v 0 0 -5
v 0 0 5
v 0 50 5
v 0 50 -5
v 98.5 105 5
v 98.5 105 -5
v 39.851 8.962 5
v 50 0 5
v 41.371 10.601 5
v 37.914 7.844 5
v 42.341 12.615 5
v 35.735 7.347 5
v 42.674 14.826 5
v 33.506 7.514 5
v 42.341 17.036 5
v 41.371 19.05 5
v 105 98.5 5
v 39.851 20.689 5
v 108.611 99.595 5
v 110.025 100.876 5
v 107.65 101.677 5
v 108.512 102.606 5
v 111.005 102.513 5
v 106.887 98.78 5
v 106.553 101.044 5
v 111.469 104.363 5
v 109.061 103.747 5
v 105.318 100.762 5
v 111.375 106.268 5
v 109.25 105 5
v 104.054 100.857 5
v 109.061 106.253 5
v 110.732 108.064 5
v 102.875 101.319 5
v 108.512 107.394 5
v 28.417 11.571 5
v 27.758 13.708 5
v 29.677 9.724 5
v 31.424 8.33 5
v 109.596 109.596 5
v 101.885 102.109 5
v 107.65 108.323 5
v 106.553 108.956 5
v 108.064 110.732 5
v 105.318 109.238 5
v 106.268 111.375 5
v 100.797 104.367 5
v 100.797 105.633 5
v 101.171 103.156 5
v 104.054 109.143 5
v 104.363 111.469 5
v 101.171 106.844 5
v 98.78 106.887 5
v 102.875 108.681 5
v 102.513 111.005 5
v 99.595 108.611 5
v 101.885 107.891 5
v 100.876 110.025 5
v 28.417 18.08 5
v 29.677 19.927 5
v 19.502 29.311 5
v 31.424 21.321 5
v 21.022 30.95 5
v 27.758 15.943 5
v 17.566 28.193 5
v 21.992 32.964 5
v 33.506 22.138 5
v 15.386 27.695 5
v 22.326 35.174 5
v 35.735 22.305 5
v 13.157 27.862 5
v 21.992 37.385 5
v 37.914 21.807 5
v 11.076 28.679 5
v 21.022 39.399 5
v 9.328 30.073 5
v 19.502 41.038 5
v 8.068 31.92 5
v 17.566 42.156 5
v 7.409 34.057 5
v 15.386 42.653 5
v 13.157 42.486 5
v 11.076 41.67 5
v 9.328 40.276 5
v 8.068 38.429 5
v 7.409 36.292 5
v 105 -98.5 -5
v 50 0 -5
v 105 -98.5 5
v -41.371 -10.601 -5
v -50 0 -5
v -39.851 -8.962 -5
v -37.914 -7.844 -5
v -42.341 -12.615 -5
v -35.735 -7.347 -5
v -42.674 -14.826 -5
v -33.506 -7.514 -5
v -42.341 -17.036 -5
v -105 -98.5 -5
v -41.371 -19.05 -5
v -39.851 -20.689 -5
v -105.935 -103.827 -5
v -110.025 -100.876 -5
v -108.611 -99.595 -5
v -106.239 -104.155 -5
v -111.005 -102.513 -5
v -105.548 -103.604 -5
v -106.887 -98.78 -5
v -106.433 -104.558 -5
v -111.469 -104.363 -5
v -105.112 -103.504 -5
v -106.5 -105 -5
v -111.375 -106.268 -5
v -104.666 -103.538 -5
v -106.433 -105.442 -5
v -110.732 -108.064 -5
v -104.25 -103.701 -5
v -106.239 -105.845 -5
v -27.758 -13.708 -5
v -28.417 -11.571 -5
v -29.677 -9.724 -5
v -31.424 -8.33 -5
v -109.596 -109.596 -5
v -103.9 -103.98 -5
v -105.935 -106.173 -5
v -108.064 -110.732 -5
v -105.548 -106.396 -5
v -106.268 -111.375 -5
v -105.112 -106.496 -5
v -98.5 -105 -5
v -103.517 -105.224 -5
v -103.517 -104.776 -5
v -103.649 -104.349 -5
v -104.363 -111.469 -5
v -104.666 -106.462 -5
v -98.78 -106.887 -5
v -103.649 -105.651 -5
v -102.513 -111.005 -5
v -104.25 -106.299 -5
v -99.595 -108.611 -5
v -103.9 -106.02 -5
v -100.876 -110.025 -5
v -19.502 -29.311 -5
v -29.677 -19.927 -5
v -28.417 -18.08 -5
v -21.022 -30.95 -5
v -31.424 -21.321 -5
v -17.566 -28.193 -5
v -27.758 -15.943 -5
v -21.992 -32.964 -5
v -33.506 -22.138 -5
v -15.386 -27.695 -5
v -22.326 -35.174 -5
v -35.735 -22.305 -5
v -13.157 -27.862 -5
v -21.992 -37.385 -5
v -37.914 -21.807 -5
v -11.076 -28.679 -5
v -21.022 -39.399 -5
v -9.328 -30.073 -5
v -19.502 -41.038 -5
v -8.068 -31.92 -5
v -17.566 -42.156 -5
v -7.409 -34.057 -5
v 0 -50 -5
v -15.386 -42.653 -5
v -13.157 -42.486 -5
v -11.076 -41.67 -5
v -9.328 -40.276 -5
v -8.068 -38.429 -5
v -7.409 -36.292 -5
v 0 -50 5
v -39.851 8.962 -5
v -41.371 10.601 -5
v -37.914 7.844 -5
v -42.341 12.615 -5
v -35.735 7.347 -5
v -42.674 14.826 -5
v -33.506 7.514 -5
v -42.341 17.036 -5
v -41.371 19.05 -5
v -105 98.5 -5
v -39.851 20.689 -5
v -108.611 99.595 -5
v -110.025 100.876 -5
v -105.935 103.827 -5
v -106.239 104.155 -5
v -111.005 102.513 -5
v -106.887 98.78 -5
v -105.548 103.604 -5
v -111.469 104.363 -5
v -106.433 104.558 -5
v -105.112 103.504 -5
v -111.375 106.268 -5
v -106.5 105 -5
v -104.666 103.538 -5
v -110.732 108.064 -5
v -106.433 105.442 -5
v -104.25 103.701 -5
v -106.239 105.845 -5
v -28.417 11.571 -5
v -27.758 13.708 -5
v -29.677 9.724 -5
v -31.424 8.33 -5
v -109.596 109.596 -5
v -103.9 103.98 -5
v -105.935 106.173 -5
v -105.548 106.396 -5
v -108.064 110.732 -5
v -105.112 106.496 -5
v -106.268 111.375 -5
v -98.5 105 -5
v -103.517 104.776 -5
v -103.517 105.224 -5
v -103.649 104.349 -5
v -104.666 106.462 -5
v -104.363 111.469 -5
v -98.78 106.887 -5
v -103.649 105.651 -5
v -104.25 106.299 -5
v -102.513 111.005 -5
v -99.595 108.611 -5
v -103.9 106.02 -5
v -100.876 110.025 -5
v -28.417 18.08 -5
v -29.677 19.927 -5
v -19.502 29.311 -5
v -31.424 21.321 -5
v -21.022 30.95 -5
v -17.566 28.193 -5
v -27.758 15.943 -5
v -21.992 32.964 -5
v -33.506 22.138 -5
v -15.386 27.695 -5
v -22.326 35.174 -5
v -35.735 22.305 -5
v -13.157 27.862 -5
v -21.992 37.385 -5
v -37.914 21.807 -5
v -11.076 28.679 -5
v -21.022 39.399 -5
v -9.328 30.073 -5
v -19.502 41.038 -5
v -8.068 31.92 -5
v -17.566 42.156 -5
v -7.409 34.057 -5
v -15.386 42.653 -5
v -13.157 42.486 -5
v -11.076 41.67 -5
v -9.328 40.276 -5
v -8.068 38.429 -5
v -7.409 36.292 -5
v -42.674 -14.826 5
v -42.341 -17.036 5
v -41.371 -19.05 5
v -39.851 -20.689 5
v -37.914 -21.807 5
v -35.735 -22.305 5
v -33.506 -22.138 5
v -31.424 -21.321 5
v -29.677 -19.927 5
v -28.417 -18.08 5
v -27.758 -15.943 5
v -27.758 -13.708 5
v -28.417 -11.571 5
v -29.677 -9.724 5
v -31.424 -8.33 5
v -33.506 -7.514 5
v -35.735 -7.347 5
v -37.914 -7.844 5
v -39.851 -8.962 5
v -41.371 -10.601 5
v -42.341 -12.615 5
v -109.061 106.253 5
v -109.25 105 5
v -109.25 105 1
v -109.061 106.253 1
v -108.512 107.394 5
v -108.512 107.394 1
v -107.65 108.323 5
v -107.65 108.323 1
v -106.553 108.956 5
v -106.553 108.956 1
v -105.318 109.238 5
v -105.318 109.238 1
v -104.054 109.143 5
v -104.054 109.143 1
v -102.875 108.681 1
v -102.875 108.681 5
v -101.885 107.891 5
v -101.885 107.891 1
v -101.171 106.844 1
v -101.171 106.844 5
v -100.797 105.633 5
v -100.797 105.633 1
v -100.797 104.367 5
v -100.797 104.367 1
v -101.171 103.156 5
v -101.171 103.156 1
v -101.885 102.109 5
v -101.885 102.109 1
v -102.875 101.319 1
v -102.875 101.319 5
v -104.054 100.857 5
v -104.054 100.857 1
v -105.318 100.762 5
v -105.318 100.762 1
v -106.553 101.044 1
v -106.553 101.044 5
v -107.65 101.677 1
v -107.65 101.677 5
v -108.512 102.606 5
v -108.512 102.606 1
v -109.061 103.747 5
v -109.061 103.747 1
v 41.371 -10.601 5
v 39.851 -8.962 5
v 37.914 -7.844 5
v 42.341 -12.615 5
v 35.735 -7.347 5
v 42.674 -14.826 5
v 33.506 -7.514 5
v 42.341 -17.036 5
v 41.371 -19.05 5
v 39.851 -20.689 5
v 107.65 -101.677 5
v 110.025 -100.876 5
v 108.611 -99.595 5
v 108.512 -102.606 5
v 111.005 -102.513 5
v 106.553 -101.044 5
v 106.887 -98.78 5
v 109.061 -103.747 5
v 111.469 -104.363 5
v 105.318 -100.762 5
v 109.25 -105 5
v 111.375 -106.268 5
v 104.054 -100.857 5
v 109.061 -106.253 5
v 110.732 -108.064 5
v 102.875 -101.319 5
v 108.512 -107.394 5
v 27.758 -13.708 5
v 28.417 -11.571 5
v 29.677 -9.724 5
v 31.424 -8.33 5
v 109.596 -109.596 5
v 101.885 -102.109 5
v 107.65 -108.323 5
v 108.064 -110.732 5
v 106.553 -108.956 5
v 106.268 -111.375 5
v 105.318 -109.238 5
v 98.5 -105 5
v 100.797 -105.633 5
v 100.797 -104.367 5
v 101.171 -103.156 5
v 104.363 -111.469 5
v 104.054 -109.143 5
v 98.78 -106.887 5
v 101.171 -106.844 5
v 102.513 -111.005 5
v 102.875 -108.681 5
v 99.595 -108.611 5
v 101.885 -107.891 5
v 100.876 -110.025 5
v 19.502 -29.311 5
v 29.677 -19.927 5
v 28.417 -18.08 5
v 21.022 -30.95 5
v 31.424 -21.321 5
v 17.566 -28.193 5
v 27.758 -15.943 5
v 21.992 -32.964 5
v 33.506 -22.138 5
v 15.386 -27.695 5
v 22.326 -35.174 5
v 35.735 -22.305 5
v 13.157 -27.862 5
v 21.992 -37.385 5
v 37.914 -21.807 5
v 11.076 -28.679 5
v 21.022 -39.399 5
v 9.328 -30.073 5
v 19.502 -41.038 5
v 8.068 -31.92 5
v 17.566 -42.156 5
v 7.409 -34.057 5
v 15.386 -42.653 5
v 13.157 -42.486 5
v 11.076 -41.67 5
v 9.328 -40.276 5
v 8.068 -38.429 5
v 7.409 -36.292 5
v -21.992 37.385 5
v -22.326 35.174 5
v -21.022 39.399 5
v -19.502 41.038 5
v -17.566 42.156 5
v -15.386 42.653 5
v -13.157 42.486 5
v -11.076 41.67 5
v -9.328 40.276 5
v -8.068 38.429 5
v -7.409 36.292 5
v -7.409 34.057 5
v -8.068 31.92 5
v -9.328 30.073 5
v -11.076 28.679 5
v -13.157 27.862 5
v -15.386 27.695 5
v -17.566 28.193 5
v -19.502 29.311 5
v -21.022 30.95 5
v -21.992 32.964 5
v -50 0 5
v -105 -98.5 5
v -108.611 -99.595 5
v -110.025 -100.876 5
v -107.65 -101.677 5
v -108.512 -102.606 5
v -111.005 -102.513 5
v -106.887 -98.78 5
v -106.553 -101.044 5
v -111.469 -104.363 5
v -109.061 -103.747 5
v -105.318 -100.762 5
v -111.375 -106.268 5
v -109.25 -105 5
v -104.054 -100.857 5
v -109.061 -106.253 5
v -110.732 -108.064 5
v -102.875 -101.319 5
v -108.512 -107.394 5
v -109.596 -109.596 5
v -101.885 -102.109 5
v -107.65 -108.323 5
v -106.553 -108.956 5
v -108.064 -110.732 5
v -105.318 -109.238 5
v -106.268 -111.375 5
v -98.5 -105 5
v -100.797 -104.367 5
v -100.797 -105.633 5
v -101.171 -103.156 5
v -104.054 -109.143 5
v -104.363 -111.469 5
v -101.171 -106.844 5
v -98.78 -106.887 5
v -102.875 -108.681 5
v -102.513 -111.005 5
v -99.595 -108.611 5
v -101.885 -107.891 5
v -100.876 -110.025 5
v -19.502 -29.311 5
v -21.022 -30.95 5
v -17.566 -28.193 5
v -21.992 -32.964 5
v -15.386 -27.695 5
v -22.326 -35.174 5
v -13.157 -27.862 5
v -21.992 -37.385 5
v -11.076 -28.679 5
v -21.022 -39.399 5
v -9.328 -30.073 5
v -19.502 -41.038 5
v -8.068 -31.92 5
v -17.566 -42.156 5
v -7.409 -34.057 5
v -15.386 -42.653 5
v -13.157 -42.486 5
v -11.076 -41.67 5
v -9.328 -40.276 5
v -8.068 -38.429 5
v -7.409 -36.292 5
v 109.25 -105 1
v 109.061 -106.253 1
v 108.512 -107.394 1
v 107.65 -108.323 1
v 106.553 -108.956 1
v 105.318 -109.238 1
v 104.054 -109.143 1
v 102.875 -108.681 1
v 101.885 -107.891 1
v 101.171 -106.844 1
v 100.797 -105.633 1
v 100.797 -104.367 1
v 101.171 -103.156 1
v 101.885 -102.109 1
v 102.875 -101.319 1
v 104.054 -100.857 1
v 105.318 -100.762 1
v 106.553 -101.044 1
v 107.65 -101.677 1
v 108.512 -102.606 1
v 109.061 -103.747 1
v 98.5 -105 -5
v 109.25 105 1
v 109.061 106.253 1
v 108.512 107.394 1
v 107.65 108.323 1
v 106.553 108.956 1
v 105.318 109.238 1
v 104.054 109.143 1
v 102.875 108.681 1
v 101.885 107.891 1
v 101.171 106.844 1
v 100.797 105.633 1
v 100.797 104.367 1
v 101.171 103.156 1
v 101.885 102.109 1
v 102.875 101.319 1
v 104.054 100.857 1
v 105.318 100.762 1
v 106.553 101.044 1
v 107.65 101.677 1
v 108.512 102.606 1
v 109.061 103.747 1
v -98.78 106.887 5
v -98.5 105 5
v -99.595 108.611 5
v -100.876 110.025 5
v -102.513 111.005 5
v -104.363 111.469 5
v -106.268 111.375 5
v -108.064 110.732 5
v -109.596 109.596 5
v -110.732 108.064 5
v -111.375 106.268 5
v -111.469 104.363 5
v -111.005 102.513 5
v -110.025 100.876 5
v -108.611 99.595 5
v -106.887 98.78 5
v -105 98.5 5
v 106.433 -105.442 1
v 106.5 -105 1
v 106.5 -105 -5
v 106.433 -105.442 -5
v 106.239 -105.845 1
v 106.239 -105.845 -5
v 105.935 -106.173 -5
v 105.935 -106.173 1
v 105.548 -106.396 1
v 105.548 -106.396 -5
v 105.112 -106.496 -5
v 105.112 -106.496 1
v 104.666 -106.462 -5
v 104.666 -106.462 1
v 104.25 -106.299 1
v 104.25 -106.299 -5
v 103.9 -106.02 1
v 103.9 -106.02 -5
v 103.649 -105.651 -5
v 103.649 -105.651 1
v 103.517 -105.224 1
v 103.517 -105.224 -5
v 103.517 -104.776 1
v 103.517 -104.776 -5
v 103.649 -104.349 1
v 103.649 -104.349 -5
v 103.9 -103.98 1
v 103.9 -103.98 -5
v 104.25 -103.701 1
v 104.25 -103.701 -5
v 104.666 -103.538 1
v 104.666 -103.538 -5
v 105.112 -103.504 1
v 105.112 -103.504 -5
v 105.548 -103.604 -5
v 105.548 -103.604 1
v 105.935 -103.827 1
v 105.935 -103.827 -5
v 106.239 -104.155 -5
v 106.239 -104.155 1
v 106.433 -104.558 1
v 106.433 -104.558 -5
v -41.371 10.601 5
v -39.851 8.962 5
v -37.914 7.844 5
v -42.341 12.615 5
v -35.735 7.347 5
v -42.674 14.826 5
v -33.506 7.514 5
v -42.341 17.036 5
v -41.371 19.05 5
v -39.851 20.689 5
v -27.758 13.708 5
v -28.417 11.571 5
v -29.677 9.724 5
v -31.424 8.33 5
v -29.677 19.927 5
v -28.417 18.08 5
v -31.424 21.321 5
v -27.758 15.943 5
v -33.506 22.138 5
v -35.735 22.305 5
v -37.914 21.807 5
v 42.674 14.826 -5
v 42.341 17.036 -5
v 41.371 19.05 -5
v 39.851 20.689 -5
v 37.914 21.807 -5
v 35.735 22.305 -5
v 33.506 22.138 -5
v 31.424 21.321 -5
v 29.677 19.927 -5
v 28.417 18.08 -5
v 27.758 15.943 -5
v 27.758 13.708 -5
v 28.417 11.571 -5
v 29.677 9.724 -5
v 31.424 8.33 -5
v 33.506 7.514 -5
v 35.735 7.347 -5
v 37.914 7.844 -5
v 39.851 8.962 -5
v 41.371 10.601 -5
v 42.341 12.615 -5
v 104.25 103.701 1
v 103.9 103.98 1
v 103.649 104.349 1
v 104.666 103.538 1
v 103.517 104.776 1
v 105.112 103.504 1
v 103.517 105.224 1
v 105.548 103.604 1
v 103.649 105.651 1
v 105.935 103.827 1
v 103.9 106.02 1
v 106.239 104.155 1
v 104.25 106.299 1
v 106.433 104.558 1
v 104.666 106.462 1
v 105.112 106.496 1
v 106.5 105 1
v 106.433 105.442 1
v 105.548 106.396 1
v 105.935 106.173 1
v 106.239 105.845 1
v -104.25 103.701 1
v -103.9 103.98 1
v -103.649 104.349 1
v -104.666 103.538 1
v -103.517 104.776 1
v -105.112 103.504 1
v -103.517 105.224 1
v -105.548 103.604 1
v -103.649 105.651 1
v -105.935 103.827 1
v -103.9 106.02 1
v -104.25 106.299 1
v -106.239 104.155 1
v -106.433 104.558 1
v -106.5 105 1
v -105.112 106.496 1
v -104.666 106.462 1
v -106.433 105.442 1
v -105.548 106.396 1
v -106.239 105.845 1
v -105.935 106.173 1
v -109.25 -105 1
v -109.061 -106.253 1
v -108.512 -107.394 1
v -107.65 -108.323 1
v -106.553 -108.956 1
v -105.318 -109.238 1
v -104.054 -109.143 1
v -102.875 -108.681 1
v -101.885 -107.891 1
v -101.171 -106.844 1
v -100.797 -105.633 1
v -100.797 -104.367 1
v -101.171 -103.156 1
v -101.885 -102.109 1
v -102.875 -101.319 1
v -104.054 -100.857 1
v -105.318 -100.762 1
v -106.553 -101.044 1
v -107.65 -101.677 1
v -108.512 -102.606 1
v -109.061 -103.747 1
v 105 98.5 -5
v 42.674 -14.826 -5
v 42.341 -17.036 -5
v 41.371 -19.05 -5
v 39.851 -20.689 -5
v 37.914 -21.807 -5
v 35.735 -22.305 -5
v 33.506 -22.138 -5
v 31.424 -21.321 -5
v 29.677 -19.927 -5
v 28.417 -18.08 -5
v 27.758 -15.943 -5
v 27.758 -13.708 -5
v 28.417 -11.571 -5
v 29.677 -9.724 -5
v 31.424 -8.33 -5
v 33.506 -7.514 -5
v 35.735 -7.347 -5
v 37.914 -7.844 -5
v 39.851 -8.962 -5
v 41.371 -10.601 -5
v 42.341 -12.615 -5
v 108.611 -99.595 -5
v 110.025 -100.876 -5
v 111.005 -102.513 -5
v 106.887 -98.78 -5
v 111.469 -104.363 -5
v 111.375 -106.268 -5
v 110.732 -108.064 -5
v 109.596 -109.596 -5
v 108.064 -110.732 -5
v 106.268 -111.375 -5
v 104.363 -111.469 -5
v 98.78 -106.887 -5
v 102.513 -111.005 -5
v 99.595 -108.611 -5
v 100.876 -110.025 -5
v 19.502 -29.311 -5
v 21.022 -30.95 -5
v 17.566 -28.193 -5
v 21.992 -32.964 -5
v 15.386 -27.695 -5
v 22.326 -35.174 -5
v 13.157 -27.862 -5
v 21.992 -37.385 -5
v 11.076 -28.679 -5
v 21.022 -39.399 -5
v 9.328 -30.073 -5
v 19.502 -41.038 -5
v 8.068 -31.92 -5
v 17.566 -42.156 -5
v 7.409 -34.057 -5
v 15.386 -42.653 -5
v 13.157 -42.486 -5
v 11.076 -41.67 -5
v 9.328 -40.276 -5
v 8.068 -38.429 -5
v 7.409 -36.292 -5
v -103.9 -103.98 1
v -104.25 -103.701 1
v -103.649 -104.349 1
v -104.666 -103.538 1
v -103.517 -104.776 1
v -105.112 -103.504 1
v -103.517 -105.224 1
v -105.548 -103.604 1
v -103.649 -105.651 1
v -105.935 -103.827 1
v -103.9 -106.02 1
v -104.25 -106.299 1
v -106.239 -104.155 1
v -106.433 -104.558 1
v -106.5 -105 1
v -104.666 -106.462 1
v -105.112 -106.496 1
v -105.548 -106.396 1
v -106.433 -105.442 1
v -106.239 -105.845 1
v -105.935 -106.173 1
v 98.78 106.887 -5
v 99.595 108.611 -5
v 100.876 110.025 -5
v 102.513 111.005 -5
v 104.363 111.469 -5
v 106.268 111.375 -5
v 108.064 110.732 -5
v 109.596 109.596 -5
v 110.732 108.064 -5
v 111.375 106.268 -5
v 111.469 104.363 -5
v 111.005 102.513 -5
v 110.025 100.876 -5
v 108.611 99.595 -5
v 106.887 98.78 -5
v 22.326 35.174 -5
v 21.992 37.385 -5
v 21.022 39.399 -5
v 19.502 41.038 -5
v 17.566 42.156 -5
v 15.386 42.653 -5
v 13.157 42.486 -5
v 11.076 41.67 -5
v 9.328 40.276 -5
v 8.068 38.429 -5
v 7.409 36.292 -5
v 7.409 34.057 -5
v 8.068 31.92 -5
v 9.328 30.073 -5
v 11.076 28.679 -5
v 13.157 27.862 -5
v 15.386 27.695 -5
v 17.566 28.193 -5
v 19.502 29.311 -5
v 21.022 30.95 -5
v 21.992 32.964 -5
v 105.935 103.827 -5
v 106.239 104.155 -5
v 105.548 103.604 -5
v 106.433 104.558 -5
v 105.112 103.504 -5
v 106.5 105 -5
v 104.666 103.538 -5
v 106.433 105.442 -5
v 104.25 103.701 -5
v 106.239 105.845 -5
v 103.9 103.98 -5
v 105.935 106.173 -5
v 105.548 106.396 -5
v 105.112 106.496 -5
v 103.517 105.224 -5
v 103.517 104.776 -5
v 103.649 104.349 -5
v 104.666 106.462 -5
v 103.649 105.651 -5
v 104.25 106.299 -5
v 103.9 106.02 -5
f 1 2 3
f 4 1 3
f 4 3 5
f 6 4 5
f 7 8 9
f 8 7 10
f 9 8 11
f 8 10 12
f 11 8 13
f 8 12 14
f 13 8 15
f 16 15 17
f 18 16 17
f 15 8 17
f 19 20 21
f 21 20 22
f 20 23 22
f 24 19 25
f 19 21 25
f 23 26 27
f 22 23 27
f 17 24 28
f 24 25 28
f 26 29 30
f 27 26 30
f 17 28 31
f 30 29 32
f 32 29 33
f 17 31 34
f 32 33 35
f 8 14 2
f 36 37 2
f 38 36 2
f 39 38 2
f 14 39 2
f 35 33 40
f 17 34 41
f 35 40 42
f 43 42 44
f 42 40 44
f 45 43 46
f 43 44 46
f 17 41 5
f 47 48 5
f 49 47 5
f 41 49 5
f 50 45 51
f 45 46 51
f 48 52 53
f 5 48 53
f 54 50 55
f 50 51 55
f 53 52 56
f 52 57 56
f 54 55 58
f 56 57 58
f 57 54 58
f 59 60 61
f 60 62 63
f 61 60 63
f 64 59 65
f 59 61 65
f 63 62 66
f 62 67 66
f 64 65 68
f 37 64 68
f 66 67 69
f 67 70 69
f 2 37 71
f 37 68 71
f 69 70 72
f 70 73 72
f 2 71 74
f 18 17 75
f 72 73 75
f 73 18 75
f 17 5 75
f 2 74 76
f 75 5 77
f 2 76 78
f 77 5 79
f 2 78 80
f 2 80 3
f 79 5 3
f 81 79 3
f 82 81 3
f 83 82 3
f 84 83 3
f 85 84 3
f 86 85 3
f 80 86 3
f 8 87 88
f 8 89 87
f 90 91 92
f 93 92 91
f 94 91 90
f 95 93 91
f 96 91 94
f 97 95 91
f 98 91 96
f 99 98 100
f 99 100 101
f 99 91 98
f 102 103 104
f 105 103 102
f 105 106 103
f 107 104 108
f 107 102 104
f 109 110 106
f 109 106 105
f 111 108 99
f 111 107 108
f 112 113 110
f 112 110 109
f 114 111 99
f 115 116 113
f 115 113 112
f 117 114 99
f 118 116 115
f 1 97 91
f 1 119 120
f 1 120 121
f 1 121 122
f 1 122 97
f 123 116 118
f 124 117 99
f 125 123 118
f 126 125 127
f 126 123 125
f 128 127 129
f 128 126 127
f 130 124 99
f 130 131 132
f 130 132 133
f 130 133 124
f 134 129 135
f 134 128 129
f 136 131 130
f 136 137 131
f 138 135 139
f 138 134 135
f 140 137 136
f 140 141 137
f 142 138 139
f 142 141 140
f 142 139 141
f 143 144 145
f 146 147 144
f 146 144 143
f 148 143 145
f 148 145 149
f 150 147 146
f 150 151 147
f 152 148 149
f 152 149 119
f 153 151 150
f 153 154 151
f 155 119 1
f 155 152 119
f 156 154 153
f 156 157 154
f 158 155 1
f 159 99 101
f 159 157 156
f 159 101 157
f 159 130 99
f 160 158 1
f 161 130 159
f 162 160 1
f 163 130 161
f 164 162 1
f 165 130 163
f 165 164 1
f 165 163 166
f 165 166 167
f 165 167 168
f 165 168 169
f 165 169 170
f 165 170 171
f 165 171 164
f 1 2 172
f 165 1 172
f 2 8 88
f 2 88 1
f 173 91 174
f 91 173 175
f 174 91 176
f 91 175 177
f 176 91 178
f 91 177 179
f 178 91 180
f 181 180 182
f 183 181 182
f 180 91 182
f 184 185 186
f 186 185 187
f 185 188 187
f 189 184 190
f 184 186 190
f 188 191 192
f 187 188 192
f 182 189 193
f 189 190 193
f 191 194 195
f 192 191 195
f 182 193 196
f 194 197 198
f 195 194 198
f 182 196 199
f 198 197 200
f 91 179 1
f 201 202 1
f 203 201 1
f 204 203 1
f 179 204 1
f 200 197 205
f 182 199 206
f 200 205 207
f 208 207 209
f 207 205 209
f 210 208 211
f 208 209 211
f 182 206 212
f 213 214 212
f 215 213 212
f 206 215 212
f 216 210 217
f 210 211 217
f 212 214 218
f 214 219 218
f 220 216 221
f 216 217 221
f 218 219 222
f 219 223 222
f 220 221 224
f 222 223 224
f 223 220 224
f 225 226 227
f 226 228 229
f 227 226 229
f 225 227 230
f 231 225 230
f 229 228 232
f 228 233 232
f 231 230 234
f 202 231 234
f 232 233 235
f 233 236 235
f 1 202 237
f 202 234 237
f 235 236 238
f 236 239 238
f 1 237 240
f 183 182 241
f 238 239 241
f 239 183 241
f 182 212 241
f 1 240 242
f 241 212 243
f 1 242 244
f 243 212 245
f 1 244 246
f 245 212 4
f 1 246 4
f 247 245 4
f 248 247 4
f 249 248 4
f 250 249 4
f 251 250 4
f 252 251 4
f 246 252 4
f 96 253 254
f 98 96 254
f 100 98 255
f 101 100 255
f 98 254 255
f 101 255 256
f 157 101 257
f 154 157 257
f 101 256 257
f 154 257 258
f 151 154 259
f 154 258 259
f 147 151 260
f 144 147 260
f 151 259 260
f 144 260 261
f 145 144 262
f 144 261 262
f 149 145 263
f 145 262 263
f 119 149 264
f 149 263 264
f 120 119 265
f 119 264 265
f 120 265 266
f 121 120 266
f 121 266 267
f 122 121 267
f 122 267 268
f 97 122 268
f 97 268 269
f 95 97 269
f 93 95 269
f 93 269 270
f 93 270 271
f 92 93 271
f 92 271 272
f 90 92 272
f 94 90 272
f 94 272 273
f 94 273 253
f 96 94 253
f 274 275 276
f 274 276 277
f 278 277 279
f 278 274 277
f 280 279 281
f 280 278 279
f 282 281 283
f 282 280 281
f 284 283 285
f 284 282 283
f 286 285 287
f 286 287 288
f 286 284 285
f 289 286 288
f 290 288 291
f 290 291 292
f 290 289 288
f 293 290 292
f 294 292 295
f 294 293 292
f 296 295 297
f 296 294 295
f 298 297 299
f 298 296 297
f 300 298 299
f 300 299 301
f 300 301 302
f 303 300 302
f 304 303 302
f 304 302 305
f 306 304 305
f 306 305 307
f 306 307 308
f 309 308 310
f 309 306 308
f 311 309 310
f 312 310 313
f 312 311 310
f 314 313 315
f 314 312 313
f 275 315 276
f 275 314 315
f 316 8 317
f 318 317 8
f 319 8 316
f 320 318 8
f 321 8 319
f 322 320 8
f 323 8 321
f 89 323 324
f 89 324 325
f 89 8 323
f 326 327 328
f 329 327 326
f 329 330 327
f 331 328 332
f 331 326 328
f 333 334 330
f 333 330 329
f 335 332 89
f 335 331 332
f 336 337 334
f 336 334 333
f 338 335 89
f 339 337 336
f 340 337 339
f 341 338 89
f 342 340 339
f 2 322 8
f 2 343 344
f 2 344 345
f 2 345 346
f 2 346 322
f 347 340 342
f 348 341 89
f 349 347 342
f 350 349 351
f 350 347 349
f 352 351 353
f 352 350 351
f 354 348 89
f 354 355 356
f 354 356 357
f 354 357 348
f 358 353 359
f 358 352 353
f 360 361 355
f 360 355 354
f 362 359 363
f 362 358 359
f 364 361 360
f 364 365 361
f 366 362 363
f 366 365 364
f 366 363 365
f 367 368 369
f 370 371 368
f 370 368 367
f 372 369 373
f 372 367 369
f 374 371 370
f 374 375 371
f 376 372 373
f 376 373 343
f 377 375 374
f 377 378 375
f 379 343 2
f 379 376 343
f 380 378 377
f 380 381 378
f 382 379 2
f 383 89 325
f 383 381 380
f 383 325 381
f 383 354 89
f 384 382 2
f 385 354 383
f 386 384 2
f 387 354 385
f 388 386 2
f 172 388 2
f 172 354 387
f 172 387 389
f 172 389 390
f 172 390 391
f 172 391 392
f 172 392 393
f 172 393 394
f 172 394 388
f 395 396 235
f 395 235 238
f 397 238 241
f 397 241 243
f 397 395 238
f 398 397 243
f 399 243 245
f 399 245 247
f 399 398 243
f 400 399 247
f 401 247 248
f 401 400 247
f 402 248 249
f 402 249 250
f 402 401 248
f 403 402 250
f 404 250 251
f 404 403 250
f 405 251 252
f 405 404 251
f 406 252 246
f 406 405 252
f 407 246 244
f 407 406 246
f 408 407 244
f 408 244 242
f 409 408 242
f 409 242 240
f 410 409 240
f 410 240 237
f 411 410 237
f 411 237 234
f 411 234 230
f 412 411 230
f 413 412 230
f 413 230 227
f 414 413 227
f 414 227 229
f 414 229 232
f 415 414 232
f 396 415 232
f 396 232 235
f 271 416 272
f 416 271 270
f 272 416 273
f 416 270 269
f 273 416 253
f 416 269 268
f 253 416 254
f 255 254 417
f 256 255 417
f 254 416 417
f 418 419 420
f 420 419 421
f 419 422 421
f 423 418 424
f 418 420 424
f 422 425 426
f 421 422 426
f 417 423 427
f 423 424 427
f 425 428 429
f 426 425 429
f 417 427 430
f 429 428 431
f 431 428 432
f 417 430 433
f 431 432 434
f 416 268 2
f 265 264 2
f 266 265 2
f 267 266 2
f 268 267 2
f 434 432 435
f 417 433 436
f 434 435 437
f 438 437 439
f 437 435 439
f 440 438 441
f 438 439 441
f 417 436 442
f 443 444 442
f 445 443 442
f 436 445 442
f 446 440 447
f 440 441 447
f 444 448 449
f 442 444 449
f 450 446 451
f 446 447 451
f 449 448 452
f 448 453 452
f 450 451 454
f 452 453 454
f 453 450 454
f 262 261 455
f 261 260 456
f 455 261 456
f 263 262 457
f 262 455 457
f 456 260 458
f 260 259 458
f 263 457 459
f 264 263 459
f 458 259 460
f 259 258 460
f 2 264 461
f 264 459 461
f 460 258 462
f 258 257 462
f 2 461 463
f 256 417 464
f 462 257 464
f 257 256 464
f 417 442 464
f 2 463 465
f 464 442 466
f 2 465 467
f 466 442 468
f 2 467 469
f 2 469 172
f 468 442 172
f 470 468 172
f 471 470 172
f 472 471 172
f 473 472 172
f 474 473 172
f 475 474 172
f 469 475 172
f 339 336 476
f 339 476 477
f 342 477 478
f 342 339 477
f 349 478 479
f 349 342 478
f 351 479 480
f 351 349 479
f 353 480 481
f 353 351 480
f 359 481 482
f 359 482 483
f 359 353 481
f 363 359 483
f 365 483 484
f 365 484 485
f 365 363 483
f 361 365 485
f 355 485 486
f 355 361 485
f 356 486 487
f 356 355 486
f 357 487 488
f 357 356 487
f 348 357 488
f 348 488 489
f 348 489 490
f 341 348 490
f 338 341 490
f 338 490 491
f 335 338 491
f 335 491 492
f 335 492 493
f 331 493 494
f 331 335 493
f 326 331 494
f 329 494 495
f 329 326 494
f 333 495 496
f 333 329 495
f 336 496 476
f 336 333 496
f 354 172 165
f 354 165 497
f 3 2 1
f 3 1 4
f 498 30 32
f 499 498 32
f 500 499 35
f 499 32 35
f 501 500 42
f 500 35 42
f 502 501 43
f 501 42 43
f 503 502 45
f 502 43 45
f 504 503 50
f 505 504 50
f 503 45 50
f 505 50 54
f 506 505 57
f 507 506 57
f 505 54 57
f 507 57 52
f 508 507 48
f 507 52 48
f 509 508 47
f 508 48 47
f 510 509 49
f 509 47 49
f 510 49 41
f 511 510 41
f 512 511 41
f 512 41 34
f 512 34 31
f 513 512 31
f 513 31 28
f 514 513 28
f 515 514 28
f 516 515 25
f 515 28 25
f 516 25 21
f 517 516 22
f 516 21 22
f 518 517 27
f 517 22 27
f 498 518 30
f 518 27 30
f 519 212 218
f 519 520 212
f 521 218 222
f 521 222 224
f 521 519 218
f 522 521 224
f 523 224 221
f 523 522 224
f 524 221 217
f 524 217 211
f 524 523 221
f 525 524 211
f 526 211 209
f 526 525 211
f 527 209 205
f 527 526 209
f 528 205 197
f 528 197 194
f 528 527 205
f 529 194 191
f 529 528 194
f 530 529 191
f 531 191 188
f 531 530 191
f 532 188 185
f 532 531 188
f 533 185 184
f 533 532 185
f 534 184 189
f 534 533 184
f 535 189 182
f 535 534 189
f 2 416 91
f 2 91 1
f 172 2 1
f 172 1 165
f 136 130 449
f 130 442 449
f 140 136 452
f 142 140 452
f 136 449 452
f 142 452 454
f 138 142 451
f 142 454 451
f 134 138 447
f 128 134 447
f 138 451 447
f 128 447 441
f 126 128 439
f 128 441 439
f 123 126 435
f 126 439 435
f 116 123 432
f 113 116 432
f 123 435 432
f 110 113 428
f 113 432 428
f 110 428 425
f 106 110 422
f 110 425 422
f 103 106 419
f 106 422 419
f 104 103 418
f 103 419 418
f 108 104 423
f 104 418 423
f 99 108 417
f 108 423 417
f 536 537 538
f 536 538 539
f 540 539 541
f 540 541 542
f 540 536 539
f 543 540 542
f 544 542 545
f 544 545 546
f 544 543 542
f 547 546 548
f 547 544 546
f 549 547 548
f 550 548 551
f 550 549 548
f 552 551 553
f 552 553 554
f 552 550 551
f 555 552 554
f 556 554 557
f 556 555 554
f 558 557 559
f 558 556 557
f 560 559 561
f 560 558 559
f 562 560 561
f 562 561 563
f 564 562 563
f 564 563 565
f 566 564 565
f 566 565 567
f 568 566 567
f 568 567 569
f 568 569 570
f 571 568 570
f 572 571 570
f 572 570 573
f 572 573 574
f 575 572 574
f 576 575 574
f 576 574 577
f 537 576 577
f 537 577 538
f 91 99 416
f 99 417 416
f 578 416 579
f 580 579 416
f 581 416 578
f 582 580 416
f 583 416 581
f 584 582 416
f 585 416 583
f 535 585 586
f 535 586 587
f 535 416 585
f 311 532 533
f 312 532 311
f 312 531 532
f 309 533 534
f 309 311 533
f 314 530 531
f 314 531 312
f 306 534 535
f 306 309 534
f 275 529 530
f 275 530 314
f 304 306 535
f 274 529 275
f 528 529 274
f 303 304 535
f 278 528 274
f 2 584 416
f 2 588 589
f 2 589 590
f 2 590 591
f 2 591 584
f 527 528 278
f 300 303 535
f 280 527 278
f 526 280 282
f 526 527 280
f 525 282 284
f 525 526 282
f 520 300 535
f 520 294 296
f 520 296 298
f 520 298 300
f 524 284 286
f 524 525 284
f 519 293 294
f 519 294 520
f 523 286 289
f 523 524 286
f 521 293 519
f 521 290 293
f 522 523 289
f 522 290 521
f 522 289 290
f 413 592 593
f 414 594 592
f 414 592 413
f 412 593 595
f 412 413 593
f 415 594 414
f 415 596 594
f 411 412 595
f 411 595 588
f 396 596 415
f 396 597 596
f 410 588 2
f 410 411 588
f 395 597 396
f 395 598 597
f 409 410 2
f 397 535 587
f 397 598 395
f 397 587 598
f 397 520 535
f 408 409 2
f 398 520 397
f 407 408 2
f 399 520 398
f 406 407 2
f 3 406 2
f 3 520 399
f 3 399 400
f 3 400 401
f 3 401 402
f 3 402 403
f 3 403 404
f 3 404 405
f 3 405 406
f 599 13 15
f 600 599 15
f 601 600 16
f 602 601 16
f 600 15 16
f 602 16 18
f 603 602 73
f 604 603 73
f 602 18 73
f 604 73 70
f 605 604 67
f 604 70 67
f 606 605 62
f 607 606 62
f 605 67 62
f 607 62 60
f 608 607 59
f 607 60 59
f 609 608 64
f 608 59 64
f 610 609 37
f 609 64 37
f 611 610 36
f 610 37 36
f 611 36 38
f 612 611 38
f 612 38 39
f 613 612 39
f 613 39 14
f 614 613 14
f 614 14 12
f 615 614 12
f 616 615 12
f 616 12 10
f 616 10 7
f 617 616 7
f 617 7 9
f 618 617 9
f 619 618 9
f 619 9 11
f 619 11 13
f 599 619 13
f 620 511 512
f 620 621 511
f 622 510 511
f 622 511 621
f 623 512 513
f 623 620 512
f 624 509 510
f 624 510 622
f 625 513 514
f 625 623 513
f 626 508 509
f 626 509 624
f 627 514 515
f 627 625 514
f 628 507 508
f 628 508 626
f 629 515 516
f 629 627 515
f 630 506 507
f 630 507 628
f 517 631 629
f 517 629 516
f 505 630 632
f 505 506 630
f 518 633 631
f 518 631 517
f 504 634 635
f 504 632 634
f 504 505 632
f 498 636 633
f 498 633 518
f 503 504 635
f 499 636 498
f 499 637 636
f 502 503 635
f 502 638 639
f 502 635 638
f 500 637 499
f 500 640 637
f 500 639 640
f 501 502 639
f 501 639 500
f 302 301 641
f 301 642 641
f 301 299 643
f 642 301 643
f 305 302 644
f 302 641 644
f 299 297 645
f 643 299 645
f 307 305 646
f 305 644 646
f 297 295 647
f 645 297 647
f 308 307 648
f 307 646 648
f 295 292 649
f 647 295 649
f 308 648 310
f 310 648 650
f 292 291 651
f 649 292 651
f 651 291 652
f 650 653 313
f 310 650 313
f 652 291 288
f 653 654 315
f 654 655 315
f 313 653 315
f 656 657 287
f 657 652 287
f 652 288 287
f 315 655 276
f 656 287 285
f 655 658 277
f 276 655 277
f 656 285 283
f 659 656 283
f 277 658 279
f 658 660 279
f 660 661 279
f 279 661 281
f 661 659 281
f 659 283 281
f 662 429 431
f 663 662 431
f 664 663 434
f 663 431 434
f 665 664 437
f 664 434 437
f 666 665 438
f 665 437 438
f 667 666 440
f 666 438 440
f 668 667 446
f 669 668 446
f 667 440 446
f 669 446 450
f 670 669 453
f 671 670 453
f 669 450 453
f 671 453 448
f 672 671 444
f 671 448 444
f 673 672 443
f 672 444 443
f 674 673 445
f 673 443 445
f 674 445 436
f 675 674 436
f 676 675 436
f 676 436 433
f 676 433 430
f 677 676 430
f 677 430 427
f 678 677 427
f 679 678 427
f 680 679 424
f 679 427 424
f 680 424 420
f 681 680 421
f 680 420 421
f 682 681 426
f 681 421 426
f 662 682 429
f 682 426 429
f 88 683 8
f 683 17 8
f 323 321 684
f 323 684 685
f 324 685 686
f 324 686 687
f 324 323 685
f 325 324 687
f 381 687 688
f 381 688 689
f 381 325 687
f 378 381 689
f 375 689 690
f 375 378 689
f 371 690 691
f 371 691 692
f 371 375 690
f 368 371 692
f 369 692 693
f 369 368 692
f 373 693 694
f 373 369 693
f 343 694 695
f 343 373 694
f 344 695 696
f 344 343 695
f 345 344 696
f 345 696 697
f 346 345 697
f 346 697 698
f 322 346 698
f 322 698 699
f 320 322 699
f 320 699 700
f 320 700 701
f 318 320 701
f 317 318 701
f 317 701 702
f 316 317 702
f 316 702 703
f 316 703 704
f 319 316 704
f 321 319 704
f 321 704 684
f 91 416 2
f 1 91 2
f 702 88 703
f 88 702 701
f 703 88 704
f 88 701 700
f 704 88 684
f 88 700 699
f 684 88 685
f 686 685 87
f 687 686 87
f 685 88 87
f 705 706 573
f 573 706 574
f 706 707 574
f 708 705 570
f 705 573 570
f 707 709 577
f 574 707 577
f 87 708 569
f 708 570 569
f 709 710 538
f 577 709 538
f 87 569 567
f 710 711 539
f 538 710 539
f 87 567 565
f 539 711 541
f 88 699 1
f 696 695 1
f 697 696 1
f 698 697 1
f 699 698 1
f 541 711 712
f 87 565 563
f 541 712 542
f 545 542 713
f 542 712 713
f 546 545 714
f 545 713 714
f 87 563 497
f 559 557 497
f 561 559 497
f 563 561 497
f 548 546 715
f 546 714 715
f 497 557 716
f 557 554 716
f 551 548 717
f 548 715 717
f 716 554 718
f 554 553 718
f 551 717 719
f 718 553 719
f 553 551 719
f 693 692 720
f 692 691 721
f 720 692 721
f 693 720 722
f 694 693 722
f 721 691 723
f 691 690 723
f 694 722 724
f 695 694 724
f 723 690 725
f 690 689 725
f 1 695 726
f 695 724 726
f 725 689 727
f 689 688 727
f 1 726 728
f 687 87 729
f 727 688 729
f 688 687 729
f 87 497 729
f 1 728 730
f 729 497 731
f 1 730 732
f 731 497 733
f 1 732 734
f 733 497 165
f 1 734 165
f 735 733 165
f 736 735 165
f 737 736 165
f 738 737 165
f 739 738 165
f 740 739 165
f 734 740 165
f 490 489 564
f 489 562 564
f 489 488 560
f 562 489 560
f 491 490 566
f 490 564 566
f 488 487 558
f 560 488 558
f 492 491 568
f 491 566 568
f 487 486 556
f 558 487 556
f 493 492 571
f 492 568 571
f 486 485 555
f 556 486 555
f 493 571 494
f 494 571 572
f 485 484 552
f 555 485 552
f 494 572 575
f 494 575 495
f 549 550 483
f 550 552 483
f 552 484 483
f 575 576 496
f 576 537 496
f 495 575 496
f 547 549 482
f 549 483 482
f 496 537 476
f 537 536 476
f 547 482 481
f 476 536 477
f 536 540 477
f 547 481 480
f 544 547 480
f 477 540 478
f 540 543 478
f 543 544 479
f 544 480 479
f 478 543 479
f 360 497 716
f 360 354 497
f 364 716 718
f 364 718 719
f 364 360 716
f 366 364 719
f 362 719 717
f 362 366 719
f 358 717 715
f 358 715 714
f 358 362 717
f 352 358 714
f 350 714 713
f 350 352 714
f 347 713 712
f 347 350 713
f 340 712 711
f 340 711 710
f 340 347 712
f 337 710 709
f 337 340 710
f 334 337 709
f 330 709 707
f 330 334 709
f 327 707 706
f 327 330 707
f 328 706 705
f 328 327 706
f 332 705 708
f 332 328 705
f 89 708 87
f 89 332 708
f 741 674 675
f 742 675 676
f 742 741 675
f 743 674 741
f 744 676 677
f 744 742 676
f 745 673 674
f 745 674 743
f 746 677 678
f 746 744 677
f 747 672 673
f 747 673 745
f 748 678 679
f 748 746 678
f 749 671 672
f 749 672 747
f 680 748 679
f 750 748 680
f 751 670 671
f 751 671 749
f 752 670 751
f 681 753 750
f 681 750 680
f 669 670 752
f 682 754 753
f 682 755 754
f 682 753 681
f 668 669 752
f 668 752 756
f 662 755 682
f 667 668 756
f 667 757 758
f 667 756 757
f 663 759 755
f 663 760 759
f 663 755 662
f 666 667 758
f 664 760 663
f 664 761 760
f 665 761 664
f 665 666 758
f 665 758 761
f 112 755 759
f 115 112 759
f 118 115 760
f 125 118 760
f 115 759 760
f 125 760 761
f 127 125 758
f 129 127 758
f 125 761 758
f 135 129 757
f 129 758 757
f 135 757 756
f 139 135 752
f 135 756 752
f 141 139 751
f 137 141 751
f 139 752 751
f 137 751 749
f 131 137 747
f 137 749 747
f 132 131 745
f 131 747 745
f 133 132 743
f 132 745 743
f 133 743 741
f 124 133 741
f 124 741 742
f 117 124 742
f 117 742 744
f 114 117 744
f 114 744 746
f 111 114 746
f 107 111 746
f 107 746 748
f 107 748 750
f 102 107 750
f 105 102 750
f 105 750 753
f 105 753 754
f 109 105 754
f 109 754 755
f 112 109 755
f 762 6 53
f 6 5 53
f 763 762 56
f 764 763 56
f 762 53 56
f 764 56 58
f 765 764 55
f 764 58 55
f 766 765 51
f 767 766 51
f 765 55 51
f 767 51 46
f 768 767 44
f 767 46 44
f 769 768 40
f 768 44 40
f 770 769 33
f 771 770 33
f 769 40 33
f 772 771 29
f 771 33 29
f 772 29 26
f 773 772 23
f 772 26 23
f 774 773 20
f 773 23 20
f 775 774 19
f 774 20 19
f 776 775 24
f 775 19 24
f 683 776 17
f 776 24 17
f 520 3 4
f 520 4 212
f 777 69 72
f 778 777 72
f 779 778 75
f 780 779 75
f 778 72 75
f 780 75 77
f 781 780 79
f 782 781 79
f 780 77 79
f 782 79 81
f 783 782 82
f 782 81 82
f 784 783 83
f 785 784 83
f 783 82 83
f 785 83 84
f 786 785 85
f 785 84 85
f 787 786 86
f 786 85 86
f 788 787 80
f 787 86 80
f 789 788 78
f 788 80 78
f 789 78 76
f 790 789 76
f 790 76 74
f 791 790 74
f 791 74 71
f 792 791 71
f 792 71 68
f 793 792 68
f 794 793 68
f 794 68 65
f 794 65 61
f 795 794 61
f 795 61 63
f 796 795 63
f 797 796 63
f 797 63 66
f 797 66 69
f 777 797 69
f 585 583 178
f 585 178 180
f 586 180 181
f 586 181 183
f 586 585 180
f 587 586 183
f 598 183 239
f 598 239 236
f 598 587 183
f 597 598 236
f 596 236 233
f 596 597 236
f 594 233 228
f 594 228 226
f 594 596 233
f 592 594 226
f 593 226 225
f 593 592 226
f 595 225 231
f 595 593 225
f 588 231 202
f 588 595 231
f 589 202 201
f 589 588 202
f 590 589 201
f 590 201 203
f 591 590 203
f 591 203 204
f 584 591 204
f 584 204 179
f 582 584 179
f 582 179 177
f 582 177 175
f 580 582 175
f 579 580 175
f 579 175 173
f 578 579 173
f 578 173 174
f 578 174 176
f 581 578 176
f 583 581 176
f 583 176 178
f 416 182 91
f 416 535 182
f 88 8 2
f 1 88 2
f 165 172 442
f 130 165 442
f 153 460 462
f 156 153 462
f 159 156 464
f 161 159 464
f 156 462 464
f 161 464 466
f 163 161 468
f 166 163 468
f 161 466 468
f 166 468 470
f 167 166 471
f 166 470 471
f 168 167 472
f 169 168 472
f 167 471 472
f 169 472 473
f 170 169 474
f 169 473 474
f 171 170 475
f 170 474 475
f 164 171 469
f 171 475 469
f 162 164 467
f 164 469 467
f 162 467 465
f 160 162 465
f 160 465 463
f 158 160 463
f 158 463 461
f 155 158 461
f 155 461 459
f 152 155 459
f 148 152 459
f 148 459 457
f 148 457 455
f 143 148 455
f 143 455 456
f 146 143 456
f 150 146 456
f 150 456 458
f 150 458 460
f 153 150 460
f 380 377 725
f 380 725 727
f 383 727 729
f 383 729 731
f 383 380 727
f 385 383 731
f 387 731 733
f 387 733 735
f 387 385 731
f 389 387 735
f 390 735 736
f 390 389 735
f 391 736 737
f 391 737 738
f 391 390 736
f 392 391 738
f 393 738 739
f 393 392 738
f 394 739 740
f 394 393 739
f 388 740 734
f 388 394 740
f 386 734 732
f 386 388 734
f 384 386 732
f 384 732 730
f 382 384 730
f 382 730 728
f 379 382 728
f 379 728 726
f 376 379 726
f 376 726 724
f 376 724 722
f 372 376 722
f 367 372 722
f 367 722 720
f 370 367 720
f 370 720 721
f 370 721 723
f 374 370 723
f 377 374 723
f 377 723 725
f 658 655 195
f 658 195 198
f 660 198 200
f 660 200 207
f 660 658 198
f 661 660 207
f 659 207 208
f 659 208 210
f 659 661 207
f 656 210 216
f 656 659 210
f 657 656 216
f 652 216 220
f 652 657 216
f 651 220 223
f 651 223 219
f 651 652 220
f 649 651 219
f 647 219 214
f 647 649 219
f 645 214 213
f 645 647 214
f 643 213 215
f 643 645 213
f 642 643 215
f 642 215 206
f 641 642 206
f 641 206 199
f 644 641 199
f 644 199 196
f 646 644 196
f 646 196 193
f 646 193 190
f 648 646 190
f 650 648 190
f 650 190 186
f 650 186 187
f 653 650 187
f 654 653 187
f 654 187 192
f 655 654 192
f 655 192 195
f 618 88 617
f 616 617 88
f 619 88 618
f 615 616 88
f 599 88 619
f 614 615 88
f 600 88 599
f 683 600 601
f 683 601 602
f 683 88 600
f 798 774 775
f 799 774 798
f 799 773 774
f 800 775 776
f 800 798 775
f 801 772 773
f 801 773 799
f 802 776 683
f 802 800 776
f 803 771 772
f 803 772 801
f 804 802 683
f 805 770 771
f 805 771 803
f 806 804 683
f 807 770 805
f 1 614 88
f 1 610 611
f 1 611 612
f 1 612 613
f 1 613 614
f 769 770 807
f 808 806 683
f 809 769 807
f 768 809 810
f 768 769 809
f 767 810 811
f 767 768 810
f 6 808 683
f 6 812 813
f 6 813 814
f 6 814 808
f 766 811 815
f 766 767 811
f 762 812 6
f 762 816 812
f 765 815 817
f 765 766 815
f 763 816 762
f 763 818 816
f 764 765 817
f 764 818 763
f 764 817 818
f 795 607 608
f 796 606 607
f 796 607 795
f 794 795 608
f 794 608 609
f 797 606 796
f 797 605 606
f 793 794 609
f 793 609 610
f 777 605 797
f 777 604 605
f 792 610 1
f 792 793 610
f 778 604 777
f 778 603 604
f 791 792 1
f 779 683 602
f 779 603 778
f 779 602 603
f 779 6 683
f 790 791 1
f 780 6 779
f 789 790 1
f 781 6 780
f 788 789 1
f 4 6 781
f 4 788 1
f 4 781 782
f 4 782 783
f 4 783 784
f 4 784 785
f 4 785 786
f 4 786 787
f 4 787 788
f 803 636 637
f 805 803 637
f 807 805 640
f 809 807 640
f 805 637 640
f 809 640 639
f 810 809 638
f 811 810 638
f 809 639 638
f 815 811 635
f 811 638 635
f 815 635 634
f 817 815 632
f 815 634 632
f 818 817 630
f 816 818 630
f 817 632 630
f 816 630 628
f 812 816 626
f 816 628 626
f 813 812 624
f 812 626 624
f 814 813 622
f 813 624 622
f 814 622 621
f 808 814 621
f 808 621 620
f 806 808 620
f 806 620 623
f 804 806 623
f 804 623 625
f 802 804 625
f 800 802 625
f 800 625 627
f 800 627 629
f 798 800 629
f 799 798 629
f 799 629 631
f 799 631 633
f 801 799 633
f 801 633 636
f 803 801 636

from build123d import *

# Parameters (mm, degrees)
RESSALTO_EXTRUS_O2_DEPTH = 5
ESBO_O4_R                = 4.25
CORTE_EXTRUS_O1_DEPTH    = 4
ESBO_O5_R                = 1.5
CORTE_EXTRUS_O2_DEPTH    = 7
ESBO_O6_R                = 7.5
CORTE_EXTRUS_O3_DEPTH    = 11


with BuildPart() as part:
    # Esboço3 → Ressalto-extrusão2 (new body, symmetric)
    with BuildSketch(Plane.XY):
        with BuildLine():
            Line((0, 50), (98.5, 105))
            ThreePointArc((98.5, 105), (109.596194078, 109.596194078), (105, 98.5))
            Line((105, 98.5), (50, 0))
            Line((50, 0), (0, 0))
            Line((0, 0), (0, 50))
        make_face()
    extrude(amount=RESSALTO_EXTRUS_O2_DEPTH, both=True)

    # Esboço4 → Corte-extrusão1 (cut)
    with BuildSketch(Plane.XY.offset(5)):
        with Locations((105, 105)):
            Circle(ESBO_O4_R)
    extrude(amount=-CORTE_EXTRUS_O1_DEPTH, mode=Mode.SUBTRACT)

    # Esboço5 → Corte-extrusão2 (cut, through all)
    with BuildSketch(Plane.XY.offset(1)):
        with Locations((105, 105)):
            Circle(ESBO_O5_R)
    extrude(amount=-CORTE_EXTRUS_O2_DEPTH, mode=Mode.SUBTRACT)

    # Esboço6 → Corte-extrusão3 (cut, through all)
    with BuildSketch(Plane.XY.offset(5)):
        with Locations((14.825558834, 35.174441166)):
            Circle(ESBO_O6_R)
        with Locations((35.174441166, 14.825558834)):
            Circle(ESBO_O6_R)
    extrude(amount=-CORTE_EXTRUS_O3_DEPTH, mode=Mode.SUBTRACT)


with BuildPart() as body_2:
    # Espelhar1: mirrored copy
    add(part.part.mirror(Plane(origin=(0, 0, 5), x_dir=(0, 0, 1), z_dir=(0, 1, 0))))


with BuildPart() as body_3:
    # Espelhar2: mirrored copy
    add(body_2.part.mirror(Plane(origin=(0, 0, 5), x_dir=(0, 0, 1), z_dir=(1, 0, 0))))


with BuildPart() as body_4:
    # Espelhar2 2: mirrored copy
    add(part.part.mirror(Plane(origin=(0, 0, 5), x_dir=(0, 0, 1), z_dir=(1, 0, 0))))


solid = Compound([part.part, body_2.part, body_3.part, body_4.part])
